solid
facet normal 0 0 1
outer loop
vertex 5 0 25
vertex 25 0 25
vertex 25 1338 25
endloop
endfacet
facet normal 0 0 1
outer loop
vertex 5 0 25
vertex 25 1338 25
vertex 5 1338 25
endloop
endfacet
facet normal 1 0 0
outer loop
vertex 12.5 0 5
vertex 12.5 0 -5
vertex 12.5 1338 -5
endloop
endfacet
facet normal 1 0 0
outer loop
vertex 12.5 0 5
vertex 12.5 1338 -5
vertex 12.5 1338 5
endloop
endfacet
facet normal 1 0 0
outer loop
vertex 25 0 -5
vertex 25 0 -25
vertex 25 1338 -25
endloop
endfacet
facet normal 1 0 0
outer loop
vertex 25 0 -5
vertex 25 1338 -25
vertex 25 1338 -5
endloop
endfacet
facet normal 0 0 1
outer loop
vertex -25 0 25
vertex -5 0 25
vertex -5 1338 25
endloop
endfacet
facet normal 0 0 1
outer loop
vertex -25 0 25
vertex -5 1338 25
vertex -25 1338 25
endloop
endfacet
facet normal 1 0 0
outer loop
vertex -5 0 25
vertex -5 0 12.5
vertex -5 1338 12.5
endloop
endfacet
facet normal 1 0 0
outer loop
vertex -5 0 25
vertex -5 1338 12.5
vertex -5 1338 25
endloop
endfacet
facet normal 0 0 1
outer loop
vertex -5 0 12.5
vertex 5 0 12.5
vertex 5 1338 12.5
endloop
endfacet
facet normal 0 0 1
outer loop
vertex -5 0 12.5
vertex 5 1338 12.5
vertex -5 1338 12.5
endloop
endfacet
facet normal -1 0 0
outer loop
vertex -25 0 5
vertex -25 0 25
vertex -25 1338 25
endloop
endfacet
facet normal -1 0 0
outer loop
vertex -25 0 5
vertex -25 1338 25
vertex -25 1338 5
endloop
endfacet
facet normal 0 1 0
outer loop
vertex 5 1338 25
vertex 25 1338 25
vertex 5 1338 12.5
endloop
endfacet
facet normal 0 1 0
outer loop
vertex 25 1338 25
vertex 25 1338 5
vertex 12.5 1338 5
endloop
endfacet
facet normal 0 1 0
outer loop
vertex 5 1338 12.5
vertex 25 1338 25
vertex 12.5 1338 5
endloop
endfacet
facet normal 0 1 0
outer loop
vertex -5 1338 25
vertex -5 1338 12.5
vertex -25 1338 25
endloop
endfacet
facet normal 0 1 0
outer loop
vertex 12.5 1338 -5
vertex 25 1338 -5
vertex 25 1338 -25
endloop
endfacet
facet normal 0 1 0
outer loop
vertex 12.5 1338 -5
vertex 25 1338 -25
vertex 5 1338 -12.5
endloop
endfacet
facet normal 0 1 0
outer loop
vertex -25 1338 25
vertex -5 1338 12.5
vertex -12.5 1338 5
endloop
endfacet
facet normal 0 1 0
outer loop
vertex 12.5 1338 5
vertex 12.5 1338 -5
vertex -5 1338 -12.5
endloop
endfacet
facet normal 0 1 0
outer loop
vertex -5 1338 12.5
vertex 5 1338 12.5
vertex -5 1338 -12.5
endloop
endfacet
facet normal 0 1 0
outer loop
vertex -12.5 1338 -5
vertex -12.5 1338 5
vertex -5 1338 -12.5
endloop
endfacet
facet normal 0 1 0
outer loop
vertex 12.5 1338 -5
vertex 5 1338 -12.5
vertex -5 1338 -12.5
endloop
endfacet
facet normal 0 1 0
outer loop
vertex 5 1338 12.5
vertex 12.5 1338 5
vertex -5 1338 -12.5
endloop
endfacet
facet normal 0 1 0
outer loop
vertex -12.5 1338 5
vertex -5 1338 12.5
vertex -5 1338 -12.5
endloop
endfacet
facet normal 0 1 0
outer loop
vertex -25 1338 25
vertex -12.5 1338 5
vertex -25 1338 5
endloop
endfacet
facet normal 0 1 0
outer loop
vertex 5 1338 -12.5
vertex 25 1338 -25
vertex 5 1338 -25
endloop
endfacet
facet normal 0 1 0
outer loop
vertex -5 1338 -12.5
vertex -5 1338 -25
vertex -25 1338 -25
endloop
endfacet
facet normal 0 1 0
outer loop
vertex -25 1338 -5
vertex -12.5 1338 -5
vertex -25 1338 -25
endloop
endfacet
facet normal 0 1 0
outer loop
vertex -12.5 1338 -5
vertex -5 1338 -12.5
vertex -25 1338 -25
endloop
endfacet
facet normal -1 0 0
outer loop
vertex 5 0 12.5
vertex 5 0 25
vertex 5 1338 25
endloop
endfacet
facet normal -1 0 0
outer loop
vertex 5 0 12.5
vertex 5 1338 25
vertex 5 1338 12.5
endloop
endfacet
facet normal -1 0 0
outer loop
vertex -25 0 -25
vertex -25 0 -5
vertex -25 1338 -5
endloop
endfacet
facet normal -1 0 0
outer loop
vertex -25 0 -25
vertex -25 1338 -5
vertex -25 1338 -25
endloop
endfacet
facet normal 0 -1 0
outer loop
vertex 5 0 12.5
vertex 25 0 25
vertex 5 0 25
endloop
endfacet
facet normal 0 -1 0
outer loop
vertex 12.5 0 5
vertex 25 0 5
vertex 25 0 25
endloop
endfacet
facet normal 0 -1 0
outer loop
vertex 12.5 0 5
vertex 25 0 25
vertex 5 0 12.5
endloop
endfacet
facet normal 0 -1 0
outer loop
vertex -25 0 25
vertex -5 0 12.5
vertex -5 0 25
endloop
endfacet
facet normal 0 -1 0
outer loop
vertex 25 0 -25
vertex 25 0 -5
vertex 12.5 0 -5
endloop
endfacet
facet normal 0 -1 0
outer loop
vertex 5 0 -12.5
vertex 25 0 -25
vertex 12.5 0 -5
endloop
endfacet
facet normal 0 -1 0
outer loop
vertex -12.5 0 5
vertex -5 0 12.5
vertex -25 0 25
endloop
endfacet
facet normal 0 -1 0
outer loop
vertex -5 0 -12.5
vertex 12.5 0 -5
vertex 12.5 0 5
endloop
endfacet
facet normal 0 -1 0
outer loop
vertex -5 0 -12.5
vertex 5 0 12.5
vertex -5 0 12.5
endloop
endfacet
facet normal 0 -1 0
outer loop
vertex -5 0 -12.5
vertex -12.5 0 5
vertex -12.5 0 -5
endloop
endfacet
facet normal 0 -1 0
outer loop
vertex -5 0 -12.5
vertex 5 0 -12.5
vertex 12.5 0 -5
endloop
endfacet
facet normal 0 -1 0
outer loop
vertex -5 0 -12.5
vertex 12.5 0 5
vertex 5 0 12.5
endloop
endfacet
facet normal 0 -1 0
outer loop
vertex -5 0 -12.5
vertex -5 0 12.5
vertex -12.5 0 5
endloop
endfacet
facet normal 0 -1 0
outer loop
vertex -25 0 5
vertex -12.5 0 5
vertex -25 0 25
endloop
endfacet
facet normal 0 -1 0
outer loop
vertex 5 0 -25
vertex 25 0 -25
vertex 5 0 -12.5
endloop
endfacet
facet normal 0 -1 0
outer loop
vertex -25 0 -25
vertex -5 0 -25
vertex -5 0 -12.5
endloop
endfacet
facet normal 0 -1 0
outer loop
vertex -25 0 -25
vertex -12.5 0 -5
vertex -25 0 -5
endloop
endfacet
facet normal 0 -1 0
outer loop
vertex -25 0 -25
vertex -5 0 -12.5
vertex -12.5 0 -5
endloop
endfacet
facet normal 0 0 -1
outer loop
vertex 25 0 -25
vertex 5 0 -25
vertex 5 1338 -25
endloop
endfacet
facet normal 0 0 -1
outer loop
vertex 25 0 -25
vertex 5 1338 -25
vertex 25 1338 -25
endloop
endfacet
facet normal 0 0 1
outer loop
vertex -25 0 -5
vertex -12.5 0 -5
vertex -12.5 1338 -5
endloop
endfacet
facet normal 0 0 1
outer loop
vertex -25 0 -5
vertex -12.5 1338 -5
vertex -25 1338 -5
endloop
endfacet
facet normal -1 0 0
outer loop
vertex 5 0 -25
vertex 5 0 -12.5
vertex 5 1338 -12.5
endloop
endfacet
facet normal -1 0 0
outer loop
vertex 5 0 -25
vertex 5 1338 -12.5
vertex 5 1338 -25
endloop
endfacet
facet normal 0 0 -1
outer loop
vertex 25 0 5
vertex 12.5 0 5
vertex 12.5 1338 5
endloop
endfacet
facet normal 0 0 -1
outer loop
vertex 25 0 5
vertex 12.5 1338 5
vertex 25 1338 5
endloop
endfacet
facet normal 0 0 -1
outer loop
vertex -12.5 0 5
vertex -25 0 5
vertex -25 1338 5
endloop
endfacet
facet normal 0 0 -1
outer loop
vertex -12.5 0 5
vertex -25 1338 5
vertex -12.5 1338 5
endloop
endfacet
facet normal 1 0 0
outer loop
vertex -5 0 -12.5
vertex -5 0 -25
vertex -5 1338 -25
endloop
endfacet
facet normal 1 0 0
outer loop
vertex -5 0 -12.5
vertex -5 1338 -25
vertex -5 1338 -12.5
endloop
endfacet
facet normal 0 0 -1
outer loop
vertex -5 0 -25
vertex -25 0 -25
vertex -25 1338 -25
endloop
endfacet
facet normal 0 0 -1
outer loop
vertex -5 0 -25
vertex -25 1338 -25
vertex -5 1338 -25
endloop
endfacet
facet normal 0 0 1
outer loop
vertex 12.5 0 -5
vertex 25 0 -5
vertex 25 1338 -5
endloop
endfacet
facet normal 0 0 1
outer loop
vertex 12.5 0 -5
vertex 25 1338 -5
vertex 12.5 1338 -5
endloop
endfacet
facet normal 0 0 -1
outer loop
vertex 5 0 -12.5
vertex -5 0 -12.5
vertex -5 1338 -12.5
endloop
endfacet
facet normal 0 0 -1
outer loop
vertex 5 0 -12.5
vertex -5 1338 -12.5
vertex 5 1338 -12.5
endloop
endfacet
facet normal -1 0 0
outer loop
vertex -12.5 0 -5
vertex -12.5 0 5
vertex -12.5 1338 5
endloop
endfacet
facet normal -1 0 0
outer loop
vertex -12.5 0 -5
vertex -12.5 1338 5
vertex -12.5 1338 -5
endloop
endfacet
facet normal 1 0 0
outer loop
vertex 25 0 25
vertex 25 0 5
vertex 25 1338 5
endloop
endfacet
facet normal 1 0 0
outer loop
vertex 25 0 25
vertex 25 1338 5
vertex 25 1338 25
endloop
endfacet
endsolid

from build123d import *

# Parameters (mm, degrees)
BOSS_EXTRUDE1_DEPTH = 1338
BOSS_EXTRUDE2_DEPTH = 10


with BuildPart() as part:
    # Sketch1 → Boss-Extrude1 (new body)
    with BuildSketch(Plane(origin=(0, 0, 0), x_dir=(1, 0, 0), z_dir=(0, 1, 0))):
        Polygon((-25, 25), (-5, 25), (-5, 12.5), (5, 12.5), (5, 25), (25, 25), (25, 5), (12.5, 5), (12.5, -5), (25, -5), (25, -25), (5, -25), (5, -12.5), (-5, -12.5), (-5, -25), (-25, -25), (-25, -5), (-12.5, -5), (-12.5, 5), (-25, 5), align=None)
    extrude(amount=BOSS_EXTRUDE1_DEPTH)

    # Sketch1<2> → Boss-Extrude2 (add)
    with BuildSketch(Plane(origin=(0, 0, 0), x_dir=(1, 0, 0), z_dir=(0, 1, 0))):
        Polygon((-25, 25), (-5, 25), (-5, 12.5), (5, 12.5), (5, 25), (25, 25), (25, 5), (12.5, 5), (12.5, -5), (25, -5), (25, -25), (5, -25), (5, -12.5), (-5, -12.5), (-5, -25), (-25, -25), (-25, -5), (-12.5, -5), (-12.5, 5), (-25, 5), align=None)
    extrude(amount=BOSS_EXTRUDE2_DEPTH)


solid = part.part
